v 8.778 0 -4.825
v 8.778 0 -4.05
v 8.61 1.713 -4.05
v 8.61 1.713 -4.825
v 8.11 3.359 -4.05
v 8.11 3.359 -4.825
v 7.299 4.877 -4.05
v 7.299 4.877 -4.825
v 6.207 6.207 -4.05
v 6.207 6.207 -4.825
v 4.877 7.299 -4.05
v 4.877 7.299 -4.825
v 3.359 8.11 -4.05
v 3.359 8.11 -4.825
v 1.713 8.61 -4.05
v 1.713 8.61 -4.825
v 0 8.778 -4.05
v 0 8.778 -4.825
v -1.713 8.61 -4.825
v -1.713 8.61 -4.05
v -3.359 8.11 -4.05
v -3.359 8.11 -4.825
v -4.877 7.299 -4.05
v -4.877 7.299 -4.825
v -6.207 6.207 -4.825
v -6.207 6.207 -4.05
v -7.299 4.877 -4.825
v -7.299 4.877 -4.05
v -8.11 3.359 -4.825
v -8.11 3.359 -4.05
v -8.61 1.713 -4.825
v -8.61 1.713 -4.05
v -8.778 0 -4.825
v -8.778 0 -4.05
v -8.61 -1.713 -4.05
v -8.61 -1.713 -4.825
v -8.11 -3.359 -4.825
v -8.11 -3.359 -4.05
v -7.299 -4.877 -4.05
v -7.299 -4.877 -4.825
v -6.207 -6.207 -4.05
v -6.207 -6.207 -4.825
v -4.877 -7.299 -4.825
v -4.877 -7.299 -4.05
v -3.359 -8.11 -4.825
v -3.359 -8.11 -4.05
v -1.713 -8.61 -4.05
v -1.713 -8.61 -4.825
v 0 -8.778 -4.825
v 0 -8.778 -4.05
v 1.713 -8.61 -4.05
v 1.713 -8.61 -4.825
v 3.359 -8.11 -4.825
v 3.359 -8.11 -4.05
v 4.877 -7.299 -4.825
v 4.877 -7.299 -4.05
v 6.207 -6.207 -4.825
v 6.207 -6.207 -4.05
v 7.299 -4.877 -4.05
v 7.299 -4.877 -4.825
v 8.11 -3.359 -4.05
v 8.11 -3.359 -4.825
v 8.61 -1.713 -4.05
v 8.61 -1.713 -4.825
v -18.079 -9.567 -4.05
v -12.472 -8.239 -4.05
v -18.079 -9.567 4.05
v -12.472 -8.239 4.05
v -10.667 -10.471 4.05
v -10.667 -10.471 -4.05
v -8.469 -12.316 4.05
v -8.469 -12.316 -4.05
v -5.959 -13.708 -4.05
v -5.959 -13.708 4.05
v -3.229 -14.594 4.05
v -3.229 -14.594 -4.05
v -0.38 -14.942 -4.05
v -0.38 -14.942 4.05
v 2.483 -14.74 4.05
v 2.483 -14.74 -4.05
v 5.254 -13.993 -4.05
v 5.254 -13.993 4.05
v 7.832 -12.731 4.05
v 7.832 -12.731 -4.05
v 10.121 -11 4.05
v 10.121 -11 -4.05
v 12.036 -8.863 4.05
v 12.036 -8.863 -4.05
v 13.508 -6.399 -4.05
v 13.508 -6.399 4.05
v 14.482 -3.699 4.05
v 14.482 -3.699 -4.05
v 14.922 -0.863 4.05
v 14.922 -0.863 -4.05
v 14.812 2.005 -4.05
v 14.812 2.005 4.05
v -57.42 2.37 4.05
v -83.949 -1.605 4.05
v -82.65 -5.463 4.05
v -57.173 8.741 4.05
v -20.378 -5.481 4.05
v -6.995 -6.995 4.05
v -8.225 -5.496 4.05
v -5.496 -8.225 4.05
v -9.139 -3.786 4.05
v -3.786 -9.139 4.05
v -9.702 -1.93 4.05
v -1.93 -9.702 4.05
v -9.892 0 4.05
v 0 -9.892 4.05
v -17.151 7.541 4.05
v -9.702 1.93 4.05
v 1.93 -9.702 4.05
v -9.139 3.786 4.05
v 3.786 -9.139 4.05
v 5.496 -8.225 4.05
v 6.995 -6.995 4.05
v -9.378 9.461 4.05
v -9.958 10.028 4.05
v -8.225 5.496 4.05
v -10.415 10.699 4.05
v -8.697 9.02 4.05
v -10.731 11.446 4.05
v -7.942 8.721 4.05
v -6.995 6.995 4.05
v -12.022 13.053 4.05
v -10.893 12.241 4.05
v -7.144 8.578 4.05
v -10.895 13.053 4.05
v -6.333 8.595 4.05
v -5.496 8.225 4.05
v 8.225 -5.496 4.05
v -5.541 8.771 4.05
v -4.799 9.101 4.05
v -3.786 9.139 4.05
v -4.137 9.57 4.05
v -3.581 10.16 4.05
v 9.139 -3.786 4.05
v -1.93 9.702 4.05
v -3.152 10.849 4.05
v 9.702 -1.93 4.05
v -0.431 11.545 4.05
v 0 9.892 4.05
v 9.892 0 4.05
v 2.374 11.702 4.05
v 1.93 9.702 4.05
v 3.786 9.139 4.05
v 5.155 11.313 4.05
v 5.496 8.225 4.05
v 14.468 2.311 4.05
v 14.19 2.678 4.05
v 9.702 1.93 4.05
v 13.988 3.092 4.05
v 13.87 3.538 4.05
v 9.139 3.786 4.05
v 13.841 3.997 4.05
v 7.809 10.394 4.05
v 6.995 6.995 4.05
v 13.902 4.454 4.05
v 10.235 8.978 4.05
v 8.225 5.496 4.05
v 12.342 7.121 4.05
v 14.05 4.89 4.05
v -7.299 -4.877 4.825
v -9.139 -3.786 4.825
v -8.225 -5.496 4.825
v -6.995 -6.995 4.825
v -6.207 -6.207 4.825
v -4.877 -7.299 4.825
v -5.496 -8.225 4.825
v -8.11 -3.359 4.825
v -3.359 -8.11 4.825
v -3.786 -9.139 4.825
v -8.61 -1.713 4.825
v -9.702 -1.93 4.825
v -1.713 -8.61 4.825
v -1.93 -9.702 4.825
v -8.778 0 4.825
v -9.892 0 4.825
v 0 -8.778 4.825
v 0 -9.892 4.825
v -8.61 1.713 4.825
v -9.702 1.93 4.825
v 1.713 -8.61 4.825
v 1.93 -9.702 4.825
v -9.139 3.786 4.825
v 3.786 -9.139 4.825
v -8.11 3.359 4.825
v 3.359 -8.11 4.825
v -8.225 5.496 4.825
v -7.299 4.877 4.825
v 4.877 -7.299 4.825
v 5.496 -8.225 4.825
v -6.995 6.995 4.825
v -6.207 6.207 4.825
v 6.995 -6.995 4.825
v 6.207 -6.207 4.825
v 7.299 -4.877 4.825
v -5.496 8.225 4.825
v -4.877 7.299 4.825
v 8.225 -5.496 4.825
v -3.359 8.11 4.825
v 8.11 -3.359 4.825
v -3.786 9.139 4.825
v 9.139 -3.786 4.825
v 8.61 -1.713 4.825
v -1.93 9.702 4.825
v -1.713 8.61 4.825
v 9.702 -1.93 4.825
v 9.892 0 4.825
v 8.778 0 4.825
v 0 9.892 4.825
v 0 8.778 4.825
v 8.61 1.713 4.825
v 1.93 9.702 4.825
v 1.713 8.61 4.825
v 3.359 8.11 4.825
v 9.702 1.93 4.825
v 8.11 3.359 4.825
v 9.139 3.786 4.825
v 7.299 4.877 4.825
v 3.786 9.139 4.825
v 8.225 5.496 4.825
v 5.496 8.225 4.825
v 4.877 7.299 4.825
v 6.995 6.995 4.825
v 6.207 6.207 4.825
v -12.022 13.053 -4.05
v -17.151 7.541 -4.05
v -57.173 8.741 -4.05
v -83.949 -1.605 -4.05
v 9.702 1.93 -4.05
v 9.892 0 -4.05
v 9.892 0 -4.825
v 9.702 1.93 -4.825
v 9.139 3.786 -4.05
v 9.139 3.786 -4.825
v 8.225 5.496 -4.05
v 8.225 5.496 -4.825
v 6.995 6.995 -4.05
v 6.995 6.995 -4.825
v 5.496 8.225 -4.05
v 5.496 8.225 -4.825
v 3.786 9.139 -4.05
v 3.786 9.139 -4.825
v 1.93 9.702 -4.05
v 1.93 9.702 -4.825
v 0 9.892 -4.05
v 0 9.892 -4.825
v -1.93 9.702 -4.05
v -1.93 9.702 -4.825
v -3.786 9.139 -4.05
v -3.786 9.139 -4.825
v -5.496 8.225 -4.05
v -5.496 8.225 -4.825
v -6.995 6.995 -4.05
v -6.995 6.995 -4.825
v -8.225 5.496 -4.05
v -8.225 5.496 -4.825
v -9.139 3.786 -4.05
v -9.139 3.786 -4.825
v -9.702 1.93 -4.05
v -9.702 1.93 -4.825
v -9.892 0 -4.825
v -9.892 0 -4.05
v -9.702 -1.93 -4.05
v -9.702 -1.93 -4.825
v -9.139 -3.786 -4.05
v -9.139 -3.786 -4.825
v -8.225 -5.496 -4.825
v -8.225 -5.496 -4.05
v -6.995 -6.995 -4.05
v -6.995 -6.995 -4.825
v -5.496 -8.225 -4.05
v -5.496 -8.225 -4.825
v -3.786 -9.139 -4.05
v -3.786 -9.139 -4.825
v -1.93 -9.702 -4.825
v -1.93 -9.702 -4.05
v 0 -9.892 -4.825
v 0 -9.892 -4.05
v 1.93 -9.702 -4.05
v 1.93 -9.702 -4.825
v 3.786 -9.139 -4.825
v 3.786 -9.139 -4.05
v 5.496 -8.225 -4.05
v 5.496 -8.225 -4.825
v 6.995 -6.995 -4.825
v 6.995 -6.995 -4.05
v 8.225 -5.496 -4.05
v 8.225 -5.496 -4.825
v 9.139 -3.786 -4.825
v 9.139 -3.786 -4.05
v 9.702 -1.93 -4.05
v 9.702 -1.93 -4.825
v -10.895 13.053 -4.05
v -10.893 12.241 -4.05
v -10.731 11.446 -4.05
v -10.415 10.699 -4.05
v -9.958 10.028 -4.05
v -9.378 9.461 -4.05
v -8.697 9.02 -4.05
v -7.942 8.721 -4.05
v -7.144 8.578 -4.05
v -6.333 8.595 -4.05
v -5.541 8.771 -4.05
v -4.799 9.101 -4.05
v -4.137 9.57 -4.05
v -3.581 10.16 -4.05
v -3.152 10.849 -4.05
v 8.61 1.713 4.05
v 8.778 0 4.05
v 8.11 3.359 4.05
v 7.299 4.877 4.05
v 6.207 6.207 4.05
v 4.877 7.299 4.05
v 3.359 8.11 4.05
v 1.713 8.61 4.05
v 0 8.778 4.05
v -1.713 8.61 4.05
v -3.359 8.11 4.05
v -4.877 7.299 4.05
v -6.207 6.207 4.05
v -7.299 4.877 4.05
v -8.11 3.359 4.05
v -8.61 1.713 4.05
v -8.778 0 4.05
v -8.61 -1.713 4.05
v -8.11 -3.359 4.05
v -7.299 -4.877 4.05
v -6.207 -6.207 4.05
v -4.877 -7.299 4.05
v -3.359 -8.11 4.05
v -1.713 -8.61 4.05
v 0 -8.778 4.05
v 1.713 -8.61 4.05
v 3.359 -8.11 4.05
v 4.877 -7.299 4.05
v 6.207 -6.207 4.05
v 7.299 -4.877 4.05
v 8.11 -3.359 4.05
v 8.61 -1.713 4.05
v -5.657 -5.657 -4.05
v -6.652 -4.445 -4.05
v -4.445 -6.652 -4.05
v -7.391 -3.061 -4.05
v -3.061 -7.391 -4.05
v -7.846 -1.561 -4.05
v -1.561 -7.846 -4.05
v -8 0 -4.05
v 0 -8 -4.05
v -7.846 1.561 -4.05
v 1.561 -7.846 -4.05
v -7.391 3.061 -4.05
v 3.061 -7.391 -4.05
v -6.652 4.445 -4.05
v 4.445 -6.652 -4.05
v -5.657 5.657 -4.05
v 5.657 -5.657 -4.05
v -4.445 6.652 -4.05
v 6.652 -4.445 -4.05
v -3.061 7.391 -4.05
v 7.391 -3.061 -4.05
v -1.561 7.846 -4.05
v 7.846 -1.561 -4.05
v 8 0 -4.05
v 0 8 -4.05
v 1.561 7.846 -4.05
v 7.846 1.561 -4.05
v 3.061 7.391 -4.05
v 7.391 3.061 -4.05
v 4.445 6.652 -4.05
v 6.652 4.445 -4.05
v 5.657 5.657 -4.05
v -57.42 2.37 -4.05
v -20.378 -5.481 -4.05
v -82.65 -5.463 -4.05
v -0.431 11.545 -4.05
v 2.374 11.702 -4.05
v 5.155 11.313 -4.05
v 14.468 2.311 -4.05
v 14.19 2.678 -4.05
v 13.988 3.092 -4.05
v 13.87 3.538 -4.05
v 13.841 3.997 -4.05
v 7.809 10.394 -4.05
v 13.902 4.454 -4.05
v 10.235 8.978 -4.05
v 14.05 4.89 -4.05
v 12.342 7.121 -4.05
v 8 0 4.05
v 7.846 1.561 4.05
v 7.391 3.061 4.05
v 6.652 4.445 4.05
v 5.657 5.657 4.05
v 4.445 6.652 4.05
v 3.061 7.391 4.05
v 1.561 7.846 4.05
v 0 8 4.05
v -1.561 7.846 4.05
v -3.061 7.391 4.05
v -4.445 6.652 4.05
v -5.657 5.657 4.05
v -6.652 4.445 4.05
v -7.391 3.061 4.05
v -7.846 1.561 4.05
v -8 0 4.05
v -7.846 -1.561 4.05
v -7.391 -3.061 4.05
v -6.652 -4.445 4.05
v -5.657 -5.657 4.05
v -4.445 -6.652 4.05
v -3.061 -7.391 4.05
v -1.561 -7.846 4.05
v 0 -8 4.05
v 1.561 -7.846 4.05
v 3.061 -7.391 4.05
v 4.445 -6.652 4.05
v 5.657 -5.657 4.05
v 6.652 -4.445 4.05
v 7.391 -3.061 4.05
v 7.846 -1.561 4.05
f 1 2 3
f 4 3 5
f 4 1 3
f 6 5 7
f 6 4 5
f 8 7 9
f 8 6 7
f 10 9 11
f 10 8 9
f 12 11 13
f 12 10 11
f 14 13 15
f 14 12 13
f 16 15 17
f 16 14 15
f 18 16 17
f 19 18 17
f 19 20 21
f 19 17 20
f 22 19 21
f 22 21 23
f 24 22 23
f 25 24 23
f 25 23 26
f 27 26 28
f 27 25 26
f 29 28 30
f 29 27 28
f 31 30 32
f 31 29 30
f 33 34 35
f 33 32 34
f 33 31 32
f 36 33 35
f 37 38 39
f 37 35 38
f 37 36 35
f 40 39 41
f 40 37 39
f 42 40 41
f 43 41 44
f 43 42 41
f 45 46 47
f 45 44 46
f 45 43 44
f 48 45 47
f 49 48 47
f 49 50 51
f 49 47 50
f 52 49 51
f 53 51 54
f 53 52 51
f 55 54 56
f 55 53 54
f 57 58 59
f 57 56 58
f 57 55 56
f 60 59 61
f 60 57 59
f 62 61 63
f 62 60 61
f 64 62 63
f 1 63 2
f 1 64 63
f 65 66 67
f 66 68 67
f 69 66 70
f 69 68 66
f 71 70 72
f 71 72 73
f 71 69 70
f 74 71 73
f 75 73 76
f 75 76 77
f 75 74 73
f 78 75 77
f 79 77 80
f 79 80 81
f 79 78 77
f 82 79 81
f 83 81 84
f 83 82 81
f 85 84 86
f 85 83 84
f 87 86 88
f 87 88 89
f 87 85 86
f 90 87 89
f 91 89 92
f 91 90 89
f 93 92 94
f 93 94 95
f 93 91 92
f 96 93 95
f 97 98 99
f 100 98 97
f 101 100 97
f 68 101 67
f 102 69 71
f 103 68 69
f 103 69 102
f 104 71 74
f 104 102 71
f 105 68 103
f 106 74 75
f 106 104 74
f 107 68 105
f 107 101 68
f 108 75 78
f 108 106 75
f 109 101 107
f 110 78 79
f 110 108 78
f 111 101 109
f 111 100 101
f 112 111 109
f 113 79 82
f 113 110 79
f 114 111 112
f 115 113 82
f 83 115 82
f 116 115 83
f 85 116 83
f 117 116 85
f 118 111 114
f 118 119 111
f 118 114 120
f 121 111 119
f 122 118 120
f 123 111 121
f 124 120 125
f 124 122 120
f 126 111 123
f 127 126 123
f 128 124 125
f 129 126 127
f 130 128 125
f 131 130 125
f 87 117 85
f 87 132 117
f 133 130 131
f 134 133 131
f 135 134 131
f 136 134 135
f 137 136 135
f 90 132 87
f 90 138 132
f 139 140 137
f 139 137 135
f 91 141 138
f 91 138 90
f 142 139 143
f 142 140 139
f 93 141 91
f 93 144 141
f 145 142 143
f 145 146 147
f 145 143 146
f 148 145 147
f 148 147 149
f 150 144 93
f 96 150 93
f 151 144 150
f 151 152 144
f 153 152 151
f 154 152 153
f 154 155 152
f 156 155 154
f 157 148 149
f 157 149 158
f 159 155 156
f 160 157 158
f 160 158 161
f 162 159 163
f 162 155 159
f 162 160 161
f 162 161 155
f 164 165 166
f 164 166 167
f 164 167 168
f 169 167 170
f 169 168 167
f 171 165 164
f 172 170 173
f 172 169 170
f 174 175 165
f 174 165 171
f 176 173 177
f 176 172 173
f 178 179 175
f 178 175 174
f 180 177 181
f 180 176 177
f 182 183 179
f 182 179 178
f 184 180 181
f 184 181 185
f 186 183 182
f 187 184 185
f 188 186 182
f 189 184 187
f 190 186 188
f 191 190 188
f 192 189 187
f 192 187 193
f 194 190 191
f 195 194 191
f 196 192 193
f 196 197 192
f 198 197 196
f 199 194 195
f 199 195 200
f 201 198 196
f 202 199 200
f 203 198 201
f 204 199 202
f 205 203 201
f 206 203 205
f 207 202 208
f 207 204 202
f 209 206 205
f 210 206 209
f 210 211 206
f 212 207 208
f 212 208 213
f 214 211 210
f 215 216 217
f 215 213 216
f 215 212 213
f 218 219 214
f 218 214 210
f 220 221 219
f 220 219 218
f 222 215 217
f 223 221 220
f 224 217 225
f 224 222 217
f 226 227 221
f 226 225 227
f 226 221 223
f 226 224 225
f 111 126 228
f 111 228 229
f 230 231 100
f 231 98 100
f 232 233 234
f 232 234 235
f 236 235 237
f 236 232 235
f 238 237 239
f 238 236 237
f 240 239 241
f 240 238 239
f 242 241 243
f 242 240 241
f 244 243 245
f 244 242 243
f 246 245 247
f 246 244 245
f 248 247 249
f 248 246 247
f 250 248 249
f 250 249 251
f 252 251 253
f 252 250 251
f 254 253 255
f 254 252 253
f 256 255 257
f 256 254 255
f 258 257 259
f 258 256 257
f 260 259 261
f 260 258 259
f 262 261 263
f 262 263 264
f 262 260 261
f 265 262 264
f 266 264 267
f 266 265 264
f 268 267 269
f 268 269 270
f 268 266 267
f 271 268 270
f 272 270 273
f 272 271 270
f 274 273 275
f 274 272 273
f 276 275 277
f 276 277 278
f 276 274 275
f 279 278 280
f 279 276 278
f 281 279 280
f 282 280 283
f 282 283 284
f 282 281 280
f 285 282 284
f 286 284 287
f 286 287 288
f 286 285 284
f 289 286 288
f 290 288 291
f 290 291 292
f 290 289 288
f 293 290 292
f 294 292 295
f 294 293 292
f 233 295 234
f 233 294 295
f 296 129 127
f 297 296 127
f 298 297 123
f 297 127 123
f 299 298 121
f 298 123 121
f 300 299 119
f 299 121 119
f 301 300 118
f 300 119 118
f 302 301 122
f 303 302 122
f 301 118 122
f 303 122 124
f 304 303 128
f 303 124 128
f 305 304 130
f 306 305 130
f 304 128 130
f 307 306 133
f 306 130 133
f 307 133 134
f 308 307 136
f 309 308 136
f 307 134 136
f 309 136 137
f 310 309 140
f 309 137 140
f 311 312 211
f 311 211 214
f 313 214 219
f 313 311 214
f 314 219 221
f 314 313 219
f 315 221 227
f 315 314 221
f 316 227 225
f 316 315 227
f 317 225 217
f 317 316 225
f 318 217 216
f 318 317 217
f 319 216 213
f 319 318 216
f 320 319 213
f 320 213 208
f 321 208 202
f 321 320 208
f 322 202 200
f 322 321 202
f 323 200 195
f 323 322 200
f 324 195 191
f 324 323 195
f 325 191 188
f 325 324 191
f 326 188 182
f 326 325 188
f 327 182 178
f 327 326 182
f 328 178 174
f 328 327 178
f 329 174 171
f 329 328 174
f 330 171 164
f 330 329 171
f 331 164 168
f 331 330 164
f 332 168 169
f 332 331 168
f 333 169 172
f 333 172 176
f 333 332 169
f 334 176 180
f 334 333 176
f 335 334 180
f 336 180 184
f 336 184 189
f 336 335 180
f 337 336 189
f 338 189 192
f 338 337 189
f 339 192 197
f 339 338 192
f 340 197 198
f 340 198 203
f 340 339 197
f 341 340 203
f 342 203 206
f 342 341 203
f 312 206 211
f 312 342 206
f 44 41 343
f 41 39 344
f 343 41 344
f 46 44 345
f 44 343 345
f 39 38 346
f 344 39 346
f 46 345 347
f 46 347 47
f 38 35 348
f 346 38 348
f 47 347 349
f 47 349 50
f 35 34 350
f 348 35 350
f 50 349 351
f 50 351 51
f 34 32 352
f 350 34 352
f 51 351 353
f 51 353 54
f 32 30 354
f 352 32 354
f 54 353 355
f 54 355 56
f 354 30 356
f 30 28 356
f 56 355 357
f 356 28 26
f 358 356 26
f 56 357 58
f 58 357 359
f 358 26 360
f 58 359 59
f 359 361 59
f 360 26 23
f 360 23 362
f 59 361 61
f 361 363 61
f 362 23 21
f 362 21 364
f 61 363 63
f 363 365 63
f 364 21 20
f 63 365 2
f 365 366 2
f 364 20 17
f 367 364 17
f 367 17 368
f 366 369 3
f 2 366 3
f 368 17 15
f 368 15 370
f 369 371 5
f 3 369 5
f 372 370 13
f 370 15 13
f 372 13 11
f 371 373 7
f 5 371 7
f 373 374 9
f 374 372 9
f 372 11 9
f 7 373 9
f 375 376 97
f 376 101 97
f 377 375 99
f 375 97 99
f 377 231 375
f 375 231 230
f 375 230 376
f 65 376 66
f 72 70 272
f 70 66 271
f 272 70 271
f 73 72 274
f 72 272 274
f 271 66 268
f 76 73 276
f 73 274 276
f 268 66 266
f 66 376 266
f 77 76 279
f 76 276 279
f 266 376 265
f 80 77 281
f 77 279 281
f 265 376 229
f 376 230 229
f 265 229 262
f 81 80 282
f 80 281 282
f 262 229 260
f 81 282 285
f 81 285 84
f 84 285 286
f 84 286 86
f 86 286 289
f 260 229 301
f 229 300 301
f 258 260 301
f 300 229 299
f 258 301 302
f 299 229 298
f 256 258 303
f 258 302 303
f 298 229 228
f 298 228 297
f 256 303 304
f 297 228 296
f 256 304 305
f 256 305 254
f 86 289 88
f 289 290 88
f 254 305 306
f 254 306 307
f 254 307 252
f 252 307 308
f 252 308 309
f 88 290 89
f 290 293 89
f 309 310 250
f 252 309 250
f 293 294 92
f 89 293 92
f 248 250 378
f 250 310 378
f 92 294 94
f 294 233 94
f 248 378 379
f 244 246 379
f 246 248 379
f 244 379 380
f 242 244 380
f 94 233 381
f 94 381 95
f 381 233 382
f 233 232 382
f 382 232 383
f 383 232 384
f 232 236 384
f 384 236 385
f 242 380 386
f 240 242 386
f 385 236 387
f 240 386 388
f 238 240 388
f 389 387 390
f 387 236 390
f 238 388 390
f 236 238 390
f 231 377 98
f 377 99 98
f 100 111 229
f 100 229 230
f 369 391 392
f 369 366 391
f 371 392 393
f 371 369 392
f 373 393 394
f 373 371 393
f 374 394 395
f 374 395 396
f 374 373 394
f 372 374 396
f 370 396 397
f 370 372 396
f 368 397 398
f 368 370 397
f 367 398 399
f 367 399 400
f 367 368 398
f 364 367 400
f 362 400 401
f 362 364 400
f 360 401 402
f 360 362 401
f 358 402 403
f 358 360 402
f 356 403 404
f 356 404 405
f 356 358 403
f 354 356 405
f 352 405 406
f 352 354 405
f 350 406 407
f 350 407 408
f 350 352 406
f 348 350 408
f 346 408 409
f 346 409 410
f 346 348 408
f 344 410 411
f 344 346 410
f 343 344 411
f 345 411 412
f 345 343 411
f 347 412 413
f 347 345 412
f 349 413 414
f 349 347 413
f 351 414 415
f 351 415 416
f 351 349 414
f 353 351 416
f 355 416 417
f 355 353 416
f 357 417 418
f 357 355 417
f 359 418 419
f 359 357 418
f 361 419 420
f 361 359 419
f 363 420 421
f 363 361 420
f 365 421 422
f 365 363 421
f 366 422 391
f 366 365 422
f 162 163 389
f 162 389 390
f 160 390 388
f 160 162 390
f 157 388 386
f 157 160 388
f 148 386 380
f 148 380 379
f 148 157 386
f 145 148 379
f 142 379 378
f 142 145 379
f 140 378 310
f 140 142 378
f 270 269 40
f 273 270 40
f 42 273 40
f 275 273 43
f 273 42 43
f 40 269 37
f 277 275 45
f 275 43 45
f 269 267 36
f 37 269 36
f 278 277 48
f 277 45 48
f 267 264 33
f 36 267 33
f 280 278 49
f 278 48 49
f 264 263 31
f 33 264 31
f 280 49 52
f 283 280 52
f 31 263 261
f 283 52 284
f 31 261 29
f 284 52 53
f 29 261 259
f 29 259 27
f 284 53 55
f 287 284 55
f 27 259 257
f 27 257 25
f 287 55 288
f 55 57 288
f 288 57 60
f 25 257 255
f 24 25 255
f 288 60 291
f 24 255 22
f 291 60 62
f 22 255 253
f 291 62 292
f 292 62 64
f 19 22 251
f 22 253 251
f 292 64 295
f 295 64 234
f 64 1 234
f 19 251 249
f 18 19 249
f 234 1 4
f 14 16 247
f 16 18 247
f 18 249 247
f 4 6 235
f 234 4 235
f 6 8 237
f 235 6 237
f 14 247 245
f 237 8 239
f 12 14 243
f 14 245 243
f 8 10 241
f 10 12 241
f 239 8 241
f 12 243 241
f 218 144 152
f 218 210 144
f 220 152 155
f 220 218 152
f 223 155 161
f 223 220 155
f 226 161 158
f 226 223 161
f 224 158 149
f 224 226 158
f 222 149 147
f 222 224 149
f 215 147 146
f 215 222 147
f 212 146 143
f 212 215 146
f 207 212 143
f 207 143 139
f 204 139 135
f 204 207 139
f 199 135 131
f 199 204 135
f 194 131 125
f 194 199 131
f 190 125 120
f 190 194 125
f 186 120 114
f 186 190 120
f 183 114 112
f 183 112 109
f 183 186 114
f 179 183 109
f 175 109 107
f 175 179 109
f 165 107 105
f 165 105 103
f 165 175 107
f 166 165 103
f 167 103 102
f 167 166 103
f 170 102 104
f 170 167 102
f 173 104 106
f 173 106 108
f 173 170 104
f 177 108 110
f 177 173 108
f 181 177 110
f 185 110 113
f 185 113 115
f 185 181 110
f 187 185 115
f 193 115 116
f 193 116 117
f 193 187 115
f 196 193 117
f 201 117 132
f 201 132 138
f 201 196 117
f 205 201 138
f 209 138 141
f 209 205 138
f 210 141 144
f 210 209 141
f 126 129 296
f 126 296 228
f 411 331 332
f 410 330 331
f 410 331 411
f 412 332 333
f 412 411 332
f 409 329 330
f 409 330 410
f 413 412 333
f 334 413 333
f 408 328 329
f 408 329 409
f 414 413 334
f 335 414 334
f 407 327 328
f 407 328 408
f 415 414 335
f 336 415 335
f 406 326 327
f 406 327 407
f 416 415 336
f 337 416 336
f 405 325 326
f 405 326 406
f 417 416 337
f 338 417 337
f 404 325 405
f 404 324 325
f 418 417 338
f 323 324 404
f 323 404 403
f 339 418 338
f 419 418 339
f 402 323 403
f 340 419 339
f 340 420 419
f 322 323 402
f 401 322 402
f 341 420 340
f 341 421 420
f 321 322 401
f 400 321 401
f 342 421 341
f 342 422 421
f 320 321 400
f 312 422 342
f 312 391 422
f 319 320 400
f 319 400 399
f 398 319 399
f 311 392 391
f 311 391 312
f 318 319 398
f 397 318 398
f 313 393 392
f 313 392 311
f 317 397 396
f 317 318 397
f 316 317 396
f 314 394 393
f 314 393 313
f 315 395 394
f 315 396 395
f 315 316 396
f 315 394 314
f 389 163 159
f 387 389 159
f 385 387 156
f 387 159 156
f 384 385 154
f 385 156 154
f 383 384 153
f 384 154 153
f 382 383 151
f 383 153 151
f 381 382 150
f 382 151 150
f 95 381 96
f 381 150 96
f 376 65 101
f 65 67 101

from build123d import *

# Parameters (mm, degrees)
SKETCH001_R   = 8
PAD_DEPTH     = 4.05
SKETCH002_R   = 9.892347
SKETCH002_R_2 = 8.778396
PAD001_DEPTH  = 4.825


with BuildPart() as part:
    # Sketch001 → Pad (new body, symmetric)
    with BuildSketch(Plane.XY):
        with BuildLine():
            ThreePointArc((-12.471576, -8.239007), (5.253972, -13.993471), (14.812215, 2.004932))
            ThreePointArc((14.049591, 4.890442), (13.918155, 3.312171), (14.812215, 2.004932))
            ThreePointArc((14.049591, 4.890442), (6.504678, 10.917918), (-3.152003, 10.849328))
            ThreePointArc((-10.894672, 13.052776), (-7.942462, 8.721353), (-3.152003, 10.849328))
            Line((-10.894672, 13.052776), (-12.022041, 13.052776))
            Line((-12.022041, 13.052776), (-17.151012, 7.540552))
            Line((-17.151012, 7.540552), (-57.172882, 8.741419))
            Line((-83.948982, -1.605249), (-57.172882, 8.741419))
            Line((-82.650063, -5.462648), (-83.948982, -1.605249))
            Line((-57.419521, 2.370234), (-82.650063, -5.462648))
            Line((-20.377901, -5.481424), (-57.419521, 2.370234))
            Line((-18.078703, -9.566922), (-20.377901, -5.481424))
            Line((-12.471576, -8.239007), (-18.078703, -9.566922))
        make_face()
        Circle(SKETCH001_R, mode=Mode.SUBTRACT)
    extrude(amount=PAD_DEPTH, both=True)

    # Sketch002 → Pad001 (join, symmetric)
    with BuildSketch(Plane.XY):
        Circle(SKETCH002_R)
        Circle(SKETCH002_R_2, mode=Mode.SUBTRACT)
    extrude(amount=PAD001_DEPTH, both=True)


solid = part.part
